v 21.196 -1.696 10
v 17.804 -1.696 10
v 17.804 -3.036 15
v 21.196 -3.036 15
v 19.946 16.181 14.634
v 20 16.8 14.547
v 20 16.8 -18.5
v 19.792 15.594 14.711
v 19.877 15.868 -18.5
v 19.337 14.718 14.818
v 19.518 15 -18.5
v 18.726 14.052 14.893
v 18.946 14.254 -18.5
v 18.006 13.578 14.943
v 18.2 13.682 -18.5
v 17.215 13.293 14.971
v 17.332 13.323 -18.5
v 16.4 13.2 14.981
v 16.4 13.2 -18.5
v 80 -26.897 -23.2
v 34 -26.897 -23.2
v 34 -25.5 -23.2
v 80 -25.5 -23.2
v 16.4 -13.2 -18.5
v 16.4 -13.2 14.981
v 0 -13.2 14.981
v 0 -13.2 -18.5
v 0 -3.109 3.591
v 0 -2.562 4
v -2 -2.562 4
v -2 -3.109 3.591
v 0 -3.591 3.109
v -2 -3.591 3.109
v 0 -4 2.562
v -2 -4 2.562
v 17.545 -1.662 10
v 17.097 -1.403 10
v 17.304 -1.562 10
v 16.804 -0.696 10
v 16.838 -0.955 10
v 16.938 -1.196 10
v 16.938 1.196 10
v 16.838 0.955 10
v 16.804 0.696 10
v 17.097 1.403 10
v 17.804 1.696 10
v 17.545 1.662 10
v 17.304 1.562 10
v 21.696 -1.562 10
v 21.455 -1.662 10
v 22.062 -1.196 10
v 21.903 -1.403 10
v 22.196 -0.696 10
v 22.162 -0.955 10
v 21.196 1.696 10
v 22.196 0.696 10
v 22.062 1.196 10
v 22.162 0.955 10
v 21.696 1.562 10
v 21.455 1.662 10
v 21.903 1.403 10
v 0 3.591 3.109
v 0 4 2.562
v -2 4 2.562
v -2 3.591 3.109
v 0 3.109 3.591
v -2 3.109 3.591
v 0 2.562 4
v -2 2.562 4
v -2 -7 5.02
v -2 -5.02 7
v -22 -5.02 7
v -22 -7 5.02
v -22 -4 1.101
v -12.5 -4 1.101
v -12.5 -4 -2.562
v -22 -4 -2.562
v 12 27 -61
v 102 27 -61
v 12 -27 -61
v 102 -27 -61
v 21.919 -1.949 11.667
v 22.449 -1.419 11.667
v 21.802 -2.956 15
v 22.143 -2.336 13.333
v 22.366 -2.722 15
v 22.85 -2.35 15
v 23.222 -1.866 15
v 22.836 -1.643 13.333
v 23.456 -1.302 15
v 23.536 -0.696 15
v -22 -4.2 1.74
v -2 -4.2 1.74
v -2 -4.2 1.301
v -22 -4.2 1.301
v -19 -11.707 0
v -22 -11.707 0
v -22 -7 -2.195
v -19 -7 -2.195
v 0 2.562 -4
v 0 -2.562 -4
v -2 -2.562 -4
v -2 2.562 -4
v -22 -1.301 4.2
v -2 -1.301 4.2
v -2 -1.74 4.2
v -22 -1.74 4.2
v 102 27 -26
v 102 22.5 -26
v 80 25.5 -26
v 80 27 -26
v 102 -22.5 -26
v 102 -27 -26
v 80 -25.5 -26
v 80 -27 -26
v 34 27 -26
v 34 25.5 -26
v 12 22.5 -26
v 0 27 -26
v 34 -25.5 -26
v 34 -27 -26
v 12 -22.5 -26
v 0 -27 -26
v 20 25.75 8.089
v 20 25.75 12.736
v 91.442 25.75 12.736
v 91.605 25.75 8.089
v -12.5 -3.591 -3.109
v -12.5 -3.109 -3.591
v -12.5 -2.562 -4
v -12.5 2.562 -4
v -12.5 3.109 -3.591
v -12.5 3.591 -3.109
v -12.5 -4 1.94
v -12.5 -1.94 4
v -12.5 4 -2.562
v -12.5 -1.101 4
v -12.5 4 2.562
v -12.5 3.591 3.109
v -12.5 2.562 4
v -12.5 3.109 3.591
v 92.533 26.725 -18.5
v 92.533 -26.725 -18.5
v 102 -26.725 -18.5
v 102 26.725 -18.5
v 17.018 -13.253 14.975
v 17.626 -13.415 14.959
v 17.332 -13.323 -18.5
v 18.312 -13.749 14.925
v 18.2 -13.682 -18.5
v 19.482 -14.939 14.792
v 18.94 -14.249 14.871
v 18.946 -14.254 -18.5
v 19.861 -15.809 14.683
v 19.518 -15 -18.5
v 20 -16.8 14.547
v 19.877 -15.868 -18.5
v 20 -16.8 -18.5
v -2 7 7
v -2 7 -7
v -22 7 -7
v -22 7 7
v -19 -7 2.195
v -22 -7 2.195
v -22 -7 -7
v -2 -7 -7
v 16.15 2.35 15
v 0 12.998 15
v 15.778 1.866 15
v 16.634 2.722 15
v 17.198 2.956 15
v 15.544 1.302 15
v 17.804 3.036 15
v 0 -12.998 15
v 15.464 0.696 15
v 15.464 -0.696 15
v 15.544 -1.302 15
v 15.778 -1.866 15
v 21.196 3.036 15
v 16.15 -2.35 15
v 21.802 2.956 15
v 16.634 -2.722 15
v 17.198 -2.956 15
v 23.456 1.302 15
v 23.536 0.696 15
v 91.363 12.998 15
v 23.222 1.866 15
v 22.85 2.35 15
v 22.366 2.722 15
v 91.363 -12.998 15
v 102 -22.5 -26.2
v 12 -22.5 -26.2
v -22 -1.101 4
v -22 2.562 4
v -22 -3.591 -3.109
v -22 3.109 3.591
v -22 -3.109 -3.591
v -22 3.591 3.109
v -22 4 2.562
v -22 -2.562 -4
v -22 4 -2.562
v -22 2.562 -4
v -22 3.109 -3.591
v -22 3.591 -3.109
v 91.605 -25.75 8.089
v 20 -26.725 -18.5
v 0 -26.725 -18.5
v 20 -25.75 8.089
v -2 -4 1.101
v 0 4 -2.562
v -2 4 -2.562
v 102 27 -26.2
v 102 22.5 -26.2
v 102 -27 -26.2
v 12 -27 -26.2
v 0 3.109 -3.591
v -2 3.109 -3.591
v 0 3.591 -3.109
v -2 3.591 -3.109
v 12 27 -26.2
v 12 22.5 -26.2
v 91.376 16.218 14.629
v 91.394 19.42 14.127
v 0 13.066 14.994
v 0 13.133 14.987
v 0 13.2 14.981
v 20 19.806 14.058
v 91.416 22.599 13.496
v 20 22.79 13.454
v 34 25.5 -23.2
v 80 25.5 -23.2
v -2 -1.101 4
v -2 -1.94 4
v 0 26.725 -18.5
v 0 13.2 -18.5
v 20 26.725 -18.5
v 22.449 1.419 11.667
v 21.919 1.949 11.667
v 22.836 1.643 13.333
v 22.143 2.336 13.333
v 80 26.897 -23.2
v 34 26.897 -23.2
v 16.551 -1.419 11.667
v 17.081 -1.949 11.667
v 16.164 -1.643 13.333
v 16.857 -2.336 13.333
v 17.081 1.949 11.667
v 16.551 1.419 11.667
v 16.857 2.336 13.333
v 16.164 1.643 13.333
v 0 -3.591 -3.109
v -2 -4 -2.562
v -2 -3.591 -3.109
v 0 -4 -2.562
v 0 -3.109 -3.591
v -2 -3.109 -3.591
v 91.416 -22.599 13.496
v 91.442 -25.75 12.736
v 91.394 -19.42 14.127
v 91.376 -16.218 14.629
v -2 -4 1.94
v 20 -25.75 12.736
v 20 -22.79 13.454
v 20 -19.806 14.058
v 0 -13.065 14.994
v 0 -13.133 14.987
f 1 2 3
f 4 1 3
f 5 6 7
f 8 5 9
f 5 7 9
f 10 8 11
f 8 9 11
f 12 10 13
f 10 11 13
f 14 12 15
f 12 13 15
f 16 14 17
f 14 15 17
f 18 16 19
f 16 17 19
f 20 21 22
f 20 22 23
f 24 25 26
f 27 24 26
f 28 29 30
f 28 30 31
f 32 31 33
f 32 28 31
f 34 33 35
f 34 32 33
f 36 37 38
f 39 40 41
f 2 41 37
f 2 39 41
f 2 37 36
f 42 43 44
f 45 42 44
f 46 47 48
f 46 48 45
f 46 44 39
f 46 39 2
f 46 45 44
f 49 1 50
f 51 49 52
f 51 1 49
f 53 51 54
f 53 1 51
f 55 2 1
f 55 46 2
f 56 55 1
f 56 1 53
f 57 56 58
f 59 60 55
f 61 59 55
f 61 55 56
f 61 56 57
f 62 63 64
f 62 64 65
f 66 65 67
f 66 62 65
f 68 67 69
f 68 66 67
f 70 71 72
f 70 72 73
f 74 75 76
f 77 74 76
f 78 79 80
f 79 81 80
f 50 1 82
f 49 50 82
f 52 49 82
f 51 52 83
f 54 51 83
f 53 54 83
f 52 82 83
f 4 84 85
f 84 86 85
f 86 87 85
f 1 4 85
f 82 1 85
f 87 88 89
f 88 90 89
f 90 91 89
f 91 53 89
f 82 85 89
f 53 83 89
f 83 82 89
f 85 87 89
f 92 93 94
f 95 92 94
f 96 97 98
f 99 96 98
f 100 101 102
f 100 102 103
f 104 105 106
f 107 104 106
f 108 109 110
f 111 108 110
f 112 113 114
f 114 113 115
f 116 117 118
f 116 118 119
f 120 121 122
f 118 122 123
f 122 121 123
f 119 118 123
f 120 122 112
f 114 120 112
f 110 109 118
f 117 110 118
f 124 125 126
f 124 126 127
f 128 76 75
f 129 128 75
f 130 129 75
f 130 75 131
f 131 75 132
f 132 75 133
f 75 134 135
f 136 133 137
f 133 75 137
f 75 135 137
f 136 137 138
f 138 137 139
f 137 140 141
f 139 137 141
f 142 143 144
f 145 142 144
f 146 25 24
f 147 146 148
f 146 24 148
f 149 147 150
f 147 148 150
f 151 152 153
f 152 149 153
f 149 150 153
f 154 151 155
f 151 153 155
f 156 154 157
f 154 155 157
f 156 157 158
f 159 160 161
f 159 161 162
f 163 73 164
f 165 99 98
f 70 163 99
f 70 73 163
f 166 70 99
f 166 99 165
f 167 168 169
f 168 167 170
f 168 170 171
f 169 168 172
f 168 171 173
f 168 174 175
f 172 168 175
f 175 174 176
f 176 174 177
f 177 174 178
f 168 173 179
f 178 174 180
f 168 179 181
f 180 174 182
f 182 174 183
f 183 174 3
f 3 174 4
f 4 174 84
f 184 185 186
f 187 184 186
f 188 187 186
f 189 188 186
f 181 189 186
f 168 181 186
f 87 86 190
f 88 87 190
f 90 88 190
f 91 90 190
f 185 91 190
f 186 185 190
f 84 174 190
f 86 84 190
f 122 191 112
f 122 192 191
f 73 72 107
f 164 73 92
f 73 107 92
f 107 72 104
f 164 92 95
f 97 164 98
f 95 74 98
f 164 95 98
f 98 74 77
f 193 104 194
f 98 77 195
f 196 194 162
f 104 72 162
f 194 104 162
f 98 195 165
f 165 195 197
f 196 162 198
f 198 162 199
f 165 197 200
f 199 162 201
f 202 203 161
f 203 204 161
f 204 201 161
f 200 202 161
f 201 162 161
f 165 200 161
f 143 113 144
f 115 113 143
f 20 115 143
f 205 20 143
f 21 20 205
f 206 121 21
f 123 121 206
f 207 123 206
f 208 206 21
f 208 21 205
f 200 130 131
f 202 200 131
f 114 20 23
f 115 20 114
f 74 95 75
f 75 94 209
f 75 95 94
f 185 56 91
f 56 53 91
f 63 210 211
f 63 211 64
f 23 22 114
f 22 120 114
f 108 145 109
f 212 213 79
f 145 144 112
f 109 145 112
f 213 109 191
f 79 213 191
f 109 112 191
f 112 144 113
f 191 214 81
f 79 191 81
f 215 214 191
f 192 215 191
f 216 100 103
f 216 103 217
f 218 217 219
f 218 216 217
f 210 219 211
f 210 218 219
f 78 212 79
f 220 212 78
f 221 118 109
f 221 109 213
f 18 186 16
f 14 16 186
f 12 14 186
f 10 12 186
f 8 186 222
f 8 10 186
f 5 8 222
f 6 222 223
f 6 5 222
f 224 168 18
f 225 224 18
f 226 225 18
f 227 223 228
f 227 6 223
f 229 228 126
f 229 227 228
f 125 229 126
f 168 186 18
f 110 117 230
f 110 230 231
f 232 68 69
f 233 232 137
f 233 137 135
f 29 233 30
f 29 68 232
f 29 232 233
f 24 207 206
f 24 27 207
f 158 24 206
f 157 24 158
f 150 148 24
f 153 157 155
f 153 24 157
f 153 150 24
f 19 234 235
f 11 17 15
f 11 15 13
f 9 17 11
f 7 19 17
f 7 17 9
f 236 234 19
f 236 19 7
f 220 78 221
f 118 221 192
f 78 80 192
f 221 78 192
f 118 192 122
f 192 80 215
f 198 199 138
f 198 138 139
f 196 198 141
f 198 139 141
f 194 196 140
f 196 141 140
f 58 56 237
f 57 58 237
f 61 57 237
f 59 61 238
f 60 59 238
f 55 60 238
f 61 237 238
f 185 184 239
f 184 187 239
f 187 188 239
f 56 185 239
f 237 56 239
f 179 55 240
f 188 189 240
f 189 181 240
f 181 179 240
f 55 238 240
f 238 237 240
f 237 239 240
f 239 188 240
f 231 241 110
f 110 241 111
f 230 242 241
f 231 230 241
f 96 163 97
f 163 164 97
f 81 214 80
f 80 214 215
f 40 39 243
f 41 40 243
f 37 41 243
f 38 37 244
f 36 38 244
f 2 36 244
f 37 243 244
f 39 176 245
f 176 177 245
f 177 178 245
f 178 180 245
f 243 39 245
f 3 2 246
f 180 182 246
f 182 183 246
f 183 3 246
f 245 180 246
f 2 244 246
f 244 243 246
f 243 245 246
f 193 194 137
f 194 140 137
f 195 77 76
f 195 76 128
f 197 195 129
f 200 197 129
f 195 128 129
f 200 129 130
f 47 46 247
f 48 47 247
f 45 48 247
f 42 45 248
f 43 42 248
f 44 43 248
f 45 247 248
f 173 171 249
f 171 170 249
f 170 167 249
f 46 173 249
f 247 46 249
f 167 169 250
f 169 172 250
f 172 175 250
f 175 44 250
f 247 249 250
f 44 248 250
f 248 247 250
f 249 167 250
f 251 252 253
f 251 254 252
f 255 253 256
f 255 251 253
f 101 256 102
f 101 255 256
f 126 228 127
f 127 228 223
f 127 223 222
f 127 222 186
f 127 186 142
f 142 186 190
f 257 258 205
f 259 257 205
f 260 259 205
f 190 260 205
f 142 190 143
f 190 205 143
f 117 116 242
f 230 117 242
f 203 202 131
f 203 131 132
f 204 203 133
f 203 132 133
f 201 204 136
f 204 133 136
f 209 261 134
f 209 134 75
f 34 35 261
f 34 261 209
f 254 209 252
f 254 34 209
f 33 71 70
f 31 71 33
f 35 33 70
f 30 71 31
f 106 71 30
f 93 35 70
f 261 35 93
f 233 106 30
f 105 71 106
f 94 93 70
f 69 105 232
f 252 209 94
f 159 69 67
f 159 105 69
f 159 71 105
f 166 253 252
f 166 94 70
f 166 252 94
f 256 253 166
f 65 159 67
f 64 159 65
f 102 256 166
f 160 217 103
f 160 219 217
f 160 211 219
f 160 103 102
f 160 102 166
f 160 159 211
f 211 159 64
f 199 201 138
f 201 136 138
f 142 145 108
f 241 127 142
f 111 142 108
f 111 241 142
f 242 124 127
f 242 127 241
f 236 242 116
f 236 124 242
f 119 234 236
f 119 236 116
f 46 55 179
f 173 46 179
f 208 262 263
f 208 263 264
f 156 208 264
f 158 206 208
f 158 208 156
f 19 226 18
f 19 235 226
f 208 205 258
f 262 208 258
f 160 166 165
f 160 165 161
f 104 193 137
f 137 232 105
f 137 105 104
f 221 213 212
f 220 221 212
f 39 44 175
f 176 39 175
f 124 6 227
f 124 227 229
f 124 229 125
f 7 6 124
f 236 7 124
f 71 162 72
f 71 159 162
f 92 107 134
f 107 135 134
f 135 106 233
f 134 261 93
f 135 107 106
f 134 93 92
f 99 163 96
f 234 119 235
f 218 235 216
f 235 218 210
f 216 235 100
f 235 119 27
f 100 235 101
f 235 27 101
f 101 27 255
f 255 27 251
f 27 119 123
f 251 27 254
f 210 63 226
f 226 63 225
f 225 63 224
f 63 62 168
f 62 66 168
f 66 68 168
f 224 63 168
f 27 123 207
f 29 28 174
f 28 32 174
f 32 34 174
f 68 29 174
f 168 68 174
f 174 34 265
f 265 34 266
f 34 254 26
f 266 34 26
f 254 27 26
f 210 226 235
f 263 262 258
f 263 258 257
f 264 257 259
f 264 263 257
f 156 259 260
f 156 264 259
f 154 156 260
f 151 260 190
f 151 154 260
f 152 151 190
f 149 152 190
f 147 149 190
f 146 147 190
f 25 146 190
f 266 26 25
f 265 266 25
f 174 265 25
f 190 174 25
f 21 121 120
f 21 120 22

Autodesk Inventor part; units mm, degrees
sketch "Sketch_2" plane through (0, 0, 0) normal (0, 1, 0) x (-1, 0, 0)
  line L0 (0, -26) -> (0, 15)
  line L1 (0, 15) -> (-91.3632, 15)
  line L2 (-91.3632, 15) -> (-92.533, -18.5)
  line L3 (-92.533, -18.5) -> (-102, -18.5)
  line L4 (-102, -18.5) -> (-102, -61)
  line L5 (-102, -61) -> (-12, -61)
  line L6 (-12, -61) -> (-12, -26)
  line L7 (-12, -26) -> (0, -26)
extrude "Extrusion1" add sketch "Sketch_2" along normal mid plane 54
sketch "Sketch_3" plane through (0, 0, 0) normal (1, 0, 0) x (0, 1, 0)
  line L0 (-30, 19) -> (-30, -26)
  line L1 (-30, -26) -> (-27, -26)
  line L2 (-27, -26) -> (-25.75, 8.0894)
  line L3 (-25.75, 8.0894) -> (-25.75, 12.7365)
  arc A0 (-5.46, 15.3565) -> (-25.75, 12.7365) centre (-5.46, -64.5185) ccw
  line L4 (-5.46, 15.3565) -> (5.46, 15.3565)
  arc A1 (25.75, 12.7365) -> (5.46, 15.3565) centre (5.46, -64.5185) ccw
  line L5 (25.75, 12.7365) -> (25.75, 8.0894)
  line L6 (25.75, 8.0894) -> (27, -26)
  line L7 (27, -26) -> (30, -26)
  line L8 (30, -26) -> (30, 19)
  line L9 (30, 19) -> (-30, 19)
extrude "Extrusion2" cut sketch "Sketch_3" along normal blind 102
sketch "Sketch_4" plane through (0, 0, 0) normal (1, 0, 0) x (0, 1, 0)
  line L0 (22.5, -26) -> (22.5, -26.2)
  line L1 (22.5, -26.2) -> (27, -26.2)
  line L2 (27, -26.2) -> (27, -26)
  line L3 (27, -26) -> (22.5, -26)
extrude "Extrusion3" cut sketch "Sketch_4" along normal blind 102
sketch "Sketch_5" plane through (0, 0, 0) normal (1, 0, 0) x (0, 1, 0)
  line L0 (-22.5, -26) -> (-27, -26)
  line L1 (-27, -26) -> (-27, -26.2)
  line L2 (-27, -26.2) -> (-22.5, -26.2)
  line L3 (-22.5, -26.2) -> (-22.5, -26)
extrude "Extrusion4" cut sketch "Sketch_5" along normal blind 102
sketch "Sketch_6" plane through (0, 27, 0) normal (0, 1, 0) x (1, 0, 0)
  line L0 (34, 23.2) -> (80, 23.2)
  line L1 (80, 23.2) -> (80, 26)
  line L2 (80, 26) -> (34, 26)
  line L3 (34, 26) -> (34, 23.2)
extrude "Extrusion5" cut sketch "Sketch_6" against normal blind 1.5
sketch "Sketch_7" plane through (0, -27, 0) normal (0, 1, 0) x (1, 0, 0)
  line L0 (34, 23.2) -> (80, 23.2)
  line L1 (80, 23.2) -> (80, 26)
  line L2 (80, 26) -> (34, 26)
  line L3 (34, 26) -> (34, 23.2)
extrude "Extrusion6" cut sketch "Sketch_7" along normal blind 1.5
sketch "Sketch_8" plane through (0, 0, -18.5) normal (0, 0, 1) x (1, 0, 0)
  line L0 (-10, -30) -> (20, -30)
  line L1 (20, -30) -> (20, -16.8)
  arc A0 (20, -16.8) -> (16.4, -13.2) centre (16.4, -16.8) ccw
  line L2 (16.4, -13.2) -> (-5, -13.2)
  line L3 (-5, -13.2) -> (-5, 13.2)
  line L4 (-5, 13.2) -> (16.4, 13.2)
  arc A1 (16.4, 13.2) -> (20, 16.8) centre (16.4, 16.8) ccw
  line L5 (20, 16.8) -> (20, 30)
  line L6 (20, 30) -> (-10, 30)
  line L7 (-10, 30) -> (-10, -30)
extrude "Extrusion7" cut sketch "Sketch_8" along normal blind 38.5
sketch "Sketch_9" plane through (0, 0, 0) normal (1, 0, 0) x (0, 1, 0)
  arc A0 (-2.5617, 4) -> (-4, 2.5617) centre (0, 0) ccw
  line L0 (-4, 2.5617) -> (-4, -2.5617)
  arc A1 (-4, -2.5617) -> (-2.5617, -4) centre (0, 0) ccw
  line L1 (-2.5617, -4) -> (2.5617, -4)
  arc A2 (2.5617, -4) -> (4, -2.5617) centre (0, 0) ccw
  line L2 (4, -2.5617) -> (4, 2.5617)
  arc A3 (4, 2.5617) -> (2.5617, 4) centre (0, 0) ccw
  line L3 (2.5617, 4) -> (-2.5617, 4)
extrude "Extrusion8" add sketch "Sketch_9" against normal blind 12.5
sketch "Sketch_10" plane through (-2, 0, 0) normal (1, 0, 0) x (0, 0, -1)
  line L0 (-7, -5.02) -> (-5.02, -7)
  line L1 (-5.02, -7) -> (7, -7)
  line L2 (7, -7) -> (7, 7)
  line L3 (7, 7) -> (-7, 7)
  line L4 (-7, 7) -> (-7, -5.02)
  line L5 (-4.2, -1.3009) -> (-4.2, -1.7397)
  line L6 (-4.2, -1.7397) -> (-1.7397, -4.2)
  line L7 (-1.7397, -4.2) -> (-1.3009, -4.2)
  line L8 (-1.3009, -4.2) -> (-1.1009, -4)
  line L9 (-1.1009, -4) -> (2.5617, -4)
  arc A0 (2.5617, -4) -> (4, -2.5617) centre (0, 0) ccw
  line L10 (4, -2.5617) -> (4, 2.5617)
  arc A1 (4, 2.5617) -> (2.5617, 4) centre (0, 0) ccw
  line L11 (2.5617, 4) -> (-2.5617, 4)
  arc A2 (-2.5617, 4) -> (-4, 2.5617) centre (0, 0) ccw
  line L12 (-4, 2.5617) -> (-4, -1.1009)
  line L13 (-4, -1.1009) -> (-4.2, -1.3009)
extrude "Extrusion9" add sketch "Sketch_10" against normal blind 20
sketch "Sketch_11" plane through (-22, 0, 0) normal (1, 0, 0) x (0, 0, -1)
  line L0 (-2.195, -7) -> (0, -11.7072)
  line L1 (0, -11.7072) -> (2.195, -7)
  line L2 (2.195, -7) -> (-2.195, -7)
extrude "Extrusion10" add sketch "Sketch_11" along normal blind 3
sketch "Sketch_1" plane through (0, 0, 10) normal (0, 0, 1) x (1, 0, 0)
  line L0 (16.804, 0.696) -> (16.804, -0.696)
  arc A0 (16.804, -0.696) -> (17.804, -1.696) centre (17.804, -0.696) ccw
  line L1 (17.804, -1.696) -> (21.196, -1.696)
  arc A1 (21.196, -1.696) -> (22.196, -0.696) centre (21.196, -0.696) ccw
  line L2 (22.196, -0.696) -> (22.196, 0.696)
  arc A2 (22.196, 0.696) -> (21.196, 1.696) centre (21.196, 0.696) ccw
  line L3 (21.196, 1.696) -> (17.804, 1.696)
  arc A3 (17.804, 1.696) -> (16.804, 0.696) centre (17.804, 0.696) ccw
extrude "Extrusion11" cut sketch "Sketch_1" along normal blind 8 draft 15
ref_plane "P3_XY" through (-12.5, 0, 0) normal (1, 0, 0) x (0, 0, -1)
ref_plane "P3_YZ" through (-12.5, 0, 0) normal (0, 0, -1) x (0, 1, 0)
ref_plane "P3_ZX" through (-12.5, 0, 0) normal (0, 1, 0) x (1, 0, 0)
properties part number "100031_P3"
